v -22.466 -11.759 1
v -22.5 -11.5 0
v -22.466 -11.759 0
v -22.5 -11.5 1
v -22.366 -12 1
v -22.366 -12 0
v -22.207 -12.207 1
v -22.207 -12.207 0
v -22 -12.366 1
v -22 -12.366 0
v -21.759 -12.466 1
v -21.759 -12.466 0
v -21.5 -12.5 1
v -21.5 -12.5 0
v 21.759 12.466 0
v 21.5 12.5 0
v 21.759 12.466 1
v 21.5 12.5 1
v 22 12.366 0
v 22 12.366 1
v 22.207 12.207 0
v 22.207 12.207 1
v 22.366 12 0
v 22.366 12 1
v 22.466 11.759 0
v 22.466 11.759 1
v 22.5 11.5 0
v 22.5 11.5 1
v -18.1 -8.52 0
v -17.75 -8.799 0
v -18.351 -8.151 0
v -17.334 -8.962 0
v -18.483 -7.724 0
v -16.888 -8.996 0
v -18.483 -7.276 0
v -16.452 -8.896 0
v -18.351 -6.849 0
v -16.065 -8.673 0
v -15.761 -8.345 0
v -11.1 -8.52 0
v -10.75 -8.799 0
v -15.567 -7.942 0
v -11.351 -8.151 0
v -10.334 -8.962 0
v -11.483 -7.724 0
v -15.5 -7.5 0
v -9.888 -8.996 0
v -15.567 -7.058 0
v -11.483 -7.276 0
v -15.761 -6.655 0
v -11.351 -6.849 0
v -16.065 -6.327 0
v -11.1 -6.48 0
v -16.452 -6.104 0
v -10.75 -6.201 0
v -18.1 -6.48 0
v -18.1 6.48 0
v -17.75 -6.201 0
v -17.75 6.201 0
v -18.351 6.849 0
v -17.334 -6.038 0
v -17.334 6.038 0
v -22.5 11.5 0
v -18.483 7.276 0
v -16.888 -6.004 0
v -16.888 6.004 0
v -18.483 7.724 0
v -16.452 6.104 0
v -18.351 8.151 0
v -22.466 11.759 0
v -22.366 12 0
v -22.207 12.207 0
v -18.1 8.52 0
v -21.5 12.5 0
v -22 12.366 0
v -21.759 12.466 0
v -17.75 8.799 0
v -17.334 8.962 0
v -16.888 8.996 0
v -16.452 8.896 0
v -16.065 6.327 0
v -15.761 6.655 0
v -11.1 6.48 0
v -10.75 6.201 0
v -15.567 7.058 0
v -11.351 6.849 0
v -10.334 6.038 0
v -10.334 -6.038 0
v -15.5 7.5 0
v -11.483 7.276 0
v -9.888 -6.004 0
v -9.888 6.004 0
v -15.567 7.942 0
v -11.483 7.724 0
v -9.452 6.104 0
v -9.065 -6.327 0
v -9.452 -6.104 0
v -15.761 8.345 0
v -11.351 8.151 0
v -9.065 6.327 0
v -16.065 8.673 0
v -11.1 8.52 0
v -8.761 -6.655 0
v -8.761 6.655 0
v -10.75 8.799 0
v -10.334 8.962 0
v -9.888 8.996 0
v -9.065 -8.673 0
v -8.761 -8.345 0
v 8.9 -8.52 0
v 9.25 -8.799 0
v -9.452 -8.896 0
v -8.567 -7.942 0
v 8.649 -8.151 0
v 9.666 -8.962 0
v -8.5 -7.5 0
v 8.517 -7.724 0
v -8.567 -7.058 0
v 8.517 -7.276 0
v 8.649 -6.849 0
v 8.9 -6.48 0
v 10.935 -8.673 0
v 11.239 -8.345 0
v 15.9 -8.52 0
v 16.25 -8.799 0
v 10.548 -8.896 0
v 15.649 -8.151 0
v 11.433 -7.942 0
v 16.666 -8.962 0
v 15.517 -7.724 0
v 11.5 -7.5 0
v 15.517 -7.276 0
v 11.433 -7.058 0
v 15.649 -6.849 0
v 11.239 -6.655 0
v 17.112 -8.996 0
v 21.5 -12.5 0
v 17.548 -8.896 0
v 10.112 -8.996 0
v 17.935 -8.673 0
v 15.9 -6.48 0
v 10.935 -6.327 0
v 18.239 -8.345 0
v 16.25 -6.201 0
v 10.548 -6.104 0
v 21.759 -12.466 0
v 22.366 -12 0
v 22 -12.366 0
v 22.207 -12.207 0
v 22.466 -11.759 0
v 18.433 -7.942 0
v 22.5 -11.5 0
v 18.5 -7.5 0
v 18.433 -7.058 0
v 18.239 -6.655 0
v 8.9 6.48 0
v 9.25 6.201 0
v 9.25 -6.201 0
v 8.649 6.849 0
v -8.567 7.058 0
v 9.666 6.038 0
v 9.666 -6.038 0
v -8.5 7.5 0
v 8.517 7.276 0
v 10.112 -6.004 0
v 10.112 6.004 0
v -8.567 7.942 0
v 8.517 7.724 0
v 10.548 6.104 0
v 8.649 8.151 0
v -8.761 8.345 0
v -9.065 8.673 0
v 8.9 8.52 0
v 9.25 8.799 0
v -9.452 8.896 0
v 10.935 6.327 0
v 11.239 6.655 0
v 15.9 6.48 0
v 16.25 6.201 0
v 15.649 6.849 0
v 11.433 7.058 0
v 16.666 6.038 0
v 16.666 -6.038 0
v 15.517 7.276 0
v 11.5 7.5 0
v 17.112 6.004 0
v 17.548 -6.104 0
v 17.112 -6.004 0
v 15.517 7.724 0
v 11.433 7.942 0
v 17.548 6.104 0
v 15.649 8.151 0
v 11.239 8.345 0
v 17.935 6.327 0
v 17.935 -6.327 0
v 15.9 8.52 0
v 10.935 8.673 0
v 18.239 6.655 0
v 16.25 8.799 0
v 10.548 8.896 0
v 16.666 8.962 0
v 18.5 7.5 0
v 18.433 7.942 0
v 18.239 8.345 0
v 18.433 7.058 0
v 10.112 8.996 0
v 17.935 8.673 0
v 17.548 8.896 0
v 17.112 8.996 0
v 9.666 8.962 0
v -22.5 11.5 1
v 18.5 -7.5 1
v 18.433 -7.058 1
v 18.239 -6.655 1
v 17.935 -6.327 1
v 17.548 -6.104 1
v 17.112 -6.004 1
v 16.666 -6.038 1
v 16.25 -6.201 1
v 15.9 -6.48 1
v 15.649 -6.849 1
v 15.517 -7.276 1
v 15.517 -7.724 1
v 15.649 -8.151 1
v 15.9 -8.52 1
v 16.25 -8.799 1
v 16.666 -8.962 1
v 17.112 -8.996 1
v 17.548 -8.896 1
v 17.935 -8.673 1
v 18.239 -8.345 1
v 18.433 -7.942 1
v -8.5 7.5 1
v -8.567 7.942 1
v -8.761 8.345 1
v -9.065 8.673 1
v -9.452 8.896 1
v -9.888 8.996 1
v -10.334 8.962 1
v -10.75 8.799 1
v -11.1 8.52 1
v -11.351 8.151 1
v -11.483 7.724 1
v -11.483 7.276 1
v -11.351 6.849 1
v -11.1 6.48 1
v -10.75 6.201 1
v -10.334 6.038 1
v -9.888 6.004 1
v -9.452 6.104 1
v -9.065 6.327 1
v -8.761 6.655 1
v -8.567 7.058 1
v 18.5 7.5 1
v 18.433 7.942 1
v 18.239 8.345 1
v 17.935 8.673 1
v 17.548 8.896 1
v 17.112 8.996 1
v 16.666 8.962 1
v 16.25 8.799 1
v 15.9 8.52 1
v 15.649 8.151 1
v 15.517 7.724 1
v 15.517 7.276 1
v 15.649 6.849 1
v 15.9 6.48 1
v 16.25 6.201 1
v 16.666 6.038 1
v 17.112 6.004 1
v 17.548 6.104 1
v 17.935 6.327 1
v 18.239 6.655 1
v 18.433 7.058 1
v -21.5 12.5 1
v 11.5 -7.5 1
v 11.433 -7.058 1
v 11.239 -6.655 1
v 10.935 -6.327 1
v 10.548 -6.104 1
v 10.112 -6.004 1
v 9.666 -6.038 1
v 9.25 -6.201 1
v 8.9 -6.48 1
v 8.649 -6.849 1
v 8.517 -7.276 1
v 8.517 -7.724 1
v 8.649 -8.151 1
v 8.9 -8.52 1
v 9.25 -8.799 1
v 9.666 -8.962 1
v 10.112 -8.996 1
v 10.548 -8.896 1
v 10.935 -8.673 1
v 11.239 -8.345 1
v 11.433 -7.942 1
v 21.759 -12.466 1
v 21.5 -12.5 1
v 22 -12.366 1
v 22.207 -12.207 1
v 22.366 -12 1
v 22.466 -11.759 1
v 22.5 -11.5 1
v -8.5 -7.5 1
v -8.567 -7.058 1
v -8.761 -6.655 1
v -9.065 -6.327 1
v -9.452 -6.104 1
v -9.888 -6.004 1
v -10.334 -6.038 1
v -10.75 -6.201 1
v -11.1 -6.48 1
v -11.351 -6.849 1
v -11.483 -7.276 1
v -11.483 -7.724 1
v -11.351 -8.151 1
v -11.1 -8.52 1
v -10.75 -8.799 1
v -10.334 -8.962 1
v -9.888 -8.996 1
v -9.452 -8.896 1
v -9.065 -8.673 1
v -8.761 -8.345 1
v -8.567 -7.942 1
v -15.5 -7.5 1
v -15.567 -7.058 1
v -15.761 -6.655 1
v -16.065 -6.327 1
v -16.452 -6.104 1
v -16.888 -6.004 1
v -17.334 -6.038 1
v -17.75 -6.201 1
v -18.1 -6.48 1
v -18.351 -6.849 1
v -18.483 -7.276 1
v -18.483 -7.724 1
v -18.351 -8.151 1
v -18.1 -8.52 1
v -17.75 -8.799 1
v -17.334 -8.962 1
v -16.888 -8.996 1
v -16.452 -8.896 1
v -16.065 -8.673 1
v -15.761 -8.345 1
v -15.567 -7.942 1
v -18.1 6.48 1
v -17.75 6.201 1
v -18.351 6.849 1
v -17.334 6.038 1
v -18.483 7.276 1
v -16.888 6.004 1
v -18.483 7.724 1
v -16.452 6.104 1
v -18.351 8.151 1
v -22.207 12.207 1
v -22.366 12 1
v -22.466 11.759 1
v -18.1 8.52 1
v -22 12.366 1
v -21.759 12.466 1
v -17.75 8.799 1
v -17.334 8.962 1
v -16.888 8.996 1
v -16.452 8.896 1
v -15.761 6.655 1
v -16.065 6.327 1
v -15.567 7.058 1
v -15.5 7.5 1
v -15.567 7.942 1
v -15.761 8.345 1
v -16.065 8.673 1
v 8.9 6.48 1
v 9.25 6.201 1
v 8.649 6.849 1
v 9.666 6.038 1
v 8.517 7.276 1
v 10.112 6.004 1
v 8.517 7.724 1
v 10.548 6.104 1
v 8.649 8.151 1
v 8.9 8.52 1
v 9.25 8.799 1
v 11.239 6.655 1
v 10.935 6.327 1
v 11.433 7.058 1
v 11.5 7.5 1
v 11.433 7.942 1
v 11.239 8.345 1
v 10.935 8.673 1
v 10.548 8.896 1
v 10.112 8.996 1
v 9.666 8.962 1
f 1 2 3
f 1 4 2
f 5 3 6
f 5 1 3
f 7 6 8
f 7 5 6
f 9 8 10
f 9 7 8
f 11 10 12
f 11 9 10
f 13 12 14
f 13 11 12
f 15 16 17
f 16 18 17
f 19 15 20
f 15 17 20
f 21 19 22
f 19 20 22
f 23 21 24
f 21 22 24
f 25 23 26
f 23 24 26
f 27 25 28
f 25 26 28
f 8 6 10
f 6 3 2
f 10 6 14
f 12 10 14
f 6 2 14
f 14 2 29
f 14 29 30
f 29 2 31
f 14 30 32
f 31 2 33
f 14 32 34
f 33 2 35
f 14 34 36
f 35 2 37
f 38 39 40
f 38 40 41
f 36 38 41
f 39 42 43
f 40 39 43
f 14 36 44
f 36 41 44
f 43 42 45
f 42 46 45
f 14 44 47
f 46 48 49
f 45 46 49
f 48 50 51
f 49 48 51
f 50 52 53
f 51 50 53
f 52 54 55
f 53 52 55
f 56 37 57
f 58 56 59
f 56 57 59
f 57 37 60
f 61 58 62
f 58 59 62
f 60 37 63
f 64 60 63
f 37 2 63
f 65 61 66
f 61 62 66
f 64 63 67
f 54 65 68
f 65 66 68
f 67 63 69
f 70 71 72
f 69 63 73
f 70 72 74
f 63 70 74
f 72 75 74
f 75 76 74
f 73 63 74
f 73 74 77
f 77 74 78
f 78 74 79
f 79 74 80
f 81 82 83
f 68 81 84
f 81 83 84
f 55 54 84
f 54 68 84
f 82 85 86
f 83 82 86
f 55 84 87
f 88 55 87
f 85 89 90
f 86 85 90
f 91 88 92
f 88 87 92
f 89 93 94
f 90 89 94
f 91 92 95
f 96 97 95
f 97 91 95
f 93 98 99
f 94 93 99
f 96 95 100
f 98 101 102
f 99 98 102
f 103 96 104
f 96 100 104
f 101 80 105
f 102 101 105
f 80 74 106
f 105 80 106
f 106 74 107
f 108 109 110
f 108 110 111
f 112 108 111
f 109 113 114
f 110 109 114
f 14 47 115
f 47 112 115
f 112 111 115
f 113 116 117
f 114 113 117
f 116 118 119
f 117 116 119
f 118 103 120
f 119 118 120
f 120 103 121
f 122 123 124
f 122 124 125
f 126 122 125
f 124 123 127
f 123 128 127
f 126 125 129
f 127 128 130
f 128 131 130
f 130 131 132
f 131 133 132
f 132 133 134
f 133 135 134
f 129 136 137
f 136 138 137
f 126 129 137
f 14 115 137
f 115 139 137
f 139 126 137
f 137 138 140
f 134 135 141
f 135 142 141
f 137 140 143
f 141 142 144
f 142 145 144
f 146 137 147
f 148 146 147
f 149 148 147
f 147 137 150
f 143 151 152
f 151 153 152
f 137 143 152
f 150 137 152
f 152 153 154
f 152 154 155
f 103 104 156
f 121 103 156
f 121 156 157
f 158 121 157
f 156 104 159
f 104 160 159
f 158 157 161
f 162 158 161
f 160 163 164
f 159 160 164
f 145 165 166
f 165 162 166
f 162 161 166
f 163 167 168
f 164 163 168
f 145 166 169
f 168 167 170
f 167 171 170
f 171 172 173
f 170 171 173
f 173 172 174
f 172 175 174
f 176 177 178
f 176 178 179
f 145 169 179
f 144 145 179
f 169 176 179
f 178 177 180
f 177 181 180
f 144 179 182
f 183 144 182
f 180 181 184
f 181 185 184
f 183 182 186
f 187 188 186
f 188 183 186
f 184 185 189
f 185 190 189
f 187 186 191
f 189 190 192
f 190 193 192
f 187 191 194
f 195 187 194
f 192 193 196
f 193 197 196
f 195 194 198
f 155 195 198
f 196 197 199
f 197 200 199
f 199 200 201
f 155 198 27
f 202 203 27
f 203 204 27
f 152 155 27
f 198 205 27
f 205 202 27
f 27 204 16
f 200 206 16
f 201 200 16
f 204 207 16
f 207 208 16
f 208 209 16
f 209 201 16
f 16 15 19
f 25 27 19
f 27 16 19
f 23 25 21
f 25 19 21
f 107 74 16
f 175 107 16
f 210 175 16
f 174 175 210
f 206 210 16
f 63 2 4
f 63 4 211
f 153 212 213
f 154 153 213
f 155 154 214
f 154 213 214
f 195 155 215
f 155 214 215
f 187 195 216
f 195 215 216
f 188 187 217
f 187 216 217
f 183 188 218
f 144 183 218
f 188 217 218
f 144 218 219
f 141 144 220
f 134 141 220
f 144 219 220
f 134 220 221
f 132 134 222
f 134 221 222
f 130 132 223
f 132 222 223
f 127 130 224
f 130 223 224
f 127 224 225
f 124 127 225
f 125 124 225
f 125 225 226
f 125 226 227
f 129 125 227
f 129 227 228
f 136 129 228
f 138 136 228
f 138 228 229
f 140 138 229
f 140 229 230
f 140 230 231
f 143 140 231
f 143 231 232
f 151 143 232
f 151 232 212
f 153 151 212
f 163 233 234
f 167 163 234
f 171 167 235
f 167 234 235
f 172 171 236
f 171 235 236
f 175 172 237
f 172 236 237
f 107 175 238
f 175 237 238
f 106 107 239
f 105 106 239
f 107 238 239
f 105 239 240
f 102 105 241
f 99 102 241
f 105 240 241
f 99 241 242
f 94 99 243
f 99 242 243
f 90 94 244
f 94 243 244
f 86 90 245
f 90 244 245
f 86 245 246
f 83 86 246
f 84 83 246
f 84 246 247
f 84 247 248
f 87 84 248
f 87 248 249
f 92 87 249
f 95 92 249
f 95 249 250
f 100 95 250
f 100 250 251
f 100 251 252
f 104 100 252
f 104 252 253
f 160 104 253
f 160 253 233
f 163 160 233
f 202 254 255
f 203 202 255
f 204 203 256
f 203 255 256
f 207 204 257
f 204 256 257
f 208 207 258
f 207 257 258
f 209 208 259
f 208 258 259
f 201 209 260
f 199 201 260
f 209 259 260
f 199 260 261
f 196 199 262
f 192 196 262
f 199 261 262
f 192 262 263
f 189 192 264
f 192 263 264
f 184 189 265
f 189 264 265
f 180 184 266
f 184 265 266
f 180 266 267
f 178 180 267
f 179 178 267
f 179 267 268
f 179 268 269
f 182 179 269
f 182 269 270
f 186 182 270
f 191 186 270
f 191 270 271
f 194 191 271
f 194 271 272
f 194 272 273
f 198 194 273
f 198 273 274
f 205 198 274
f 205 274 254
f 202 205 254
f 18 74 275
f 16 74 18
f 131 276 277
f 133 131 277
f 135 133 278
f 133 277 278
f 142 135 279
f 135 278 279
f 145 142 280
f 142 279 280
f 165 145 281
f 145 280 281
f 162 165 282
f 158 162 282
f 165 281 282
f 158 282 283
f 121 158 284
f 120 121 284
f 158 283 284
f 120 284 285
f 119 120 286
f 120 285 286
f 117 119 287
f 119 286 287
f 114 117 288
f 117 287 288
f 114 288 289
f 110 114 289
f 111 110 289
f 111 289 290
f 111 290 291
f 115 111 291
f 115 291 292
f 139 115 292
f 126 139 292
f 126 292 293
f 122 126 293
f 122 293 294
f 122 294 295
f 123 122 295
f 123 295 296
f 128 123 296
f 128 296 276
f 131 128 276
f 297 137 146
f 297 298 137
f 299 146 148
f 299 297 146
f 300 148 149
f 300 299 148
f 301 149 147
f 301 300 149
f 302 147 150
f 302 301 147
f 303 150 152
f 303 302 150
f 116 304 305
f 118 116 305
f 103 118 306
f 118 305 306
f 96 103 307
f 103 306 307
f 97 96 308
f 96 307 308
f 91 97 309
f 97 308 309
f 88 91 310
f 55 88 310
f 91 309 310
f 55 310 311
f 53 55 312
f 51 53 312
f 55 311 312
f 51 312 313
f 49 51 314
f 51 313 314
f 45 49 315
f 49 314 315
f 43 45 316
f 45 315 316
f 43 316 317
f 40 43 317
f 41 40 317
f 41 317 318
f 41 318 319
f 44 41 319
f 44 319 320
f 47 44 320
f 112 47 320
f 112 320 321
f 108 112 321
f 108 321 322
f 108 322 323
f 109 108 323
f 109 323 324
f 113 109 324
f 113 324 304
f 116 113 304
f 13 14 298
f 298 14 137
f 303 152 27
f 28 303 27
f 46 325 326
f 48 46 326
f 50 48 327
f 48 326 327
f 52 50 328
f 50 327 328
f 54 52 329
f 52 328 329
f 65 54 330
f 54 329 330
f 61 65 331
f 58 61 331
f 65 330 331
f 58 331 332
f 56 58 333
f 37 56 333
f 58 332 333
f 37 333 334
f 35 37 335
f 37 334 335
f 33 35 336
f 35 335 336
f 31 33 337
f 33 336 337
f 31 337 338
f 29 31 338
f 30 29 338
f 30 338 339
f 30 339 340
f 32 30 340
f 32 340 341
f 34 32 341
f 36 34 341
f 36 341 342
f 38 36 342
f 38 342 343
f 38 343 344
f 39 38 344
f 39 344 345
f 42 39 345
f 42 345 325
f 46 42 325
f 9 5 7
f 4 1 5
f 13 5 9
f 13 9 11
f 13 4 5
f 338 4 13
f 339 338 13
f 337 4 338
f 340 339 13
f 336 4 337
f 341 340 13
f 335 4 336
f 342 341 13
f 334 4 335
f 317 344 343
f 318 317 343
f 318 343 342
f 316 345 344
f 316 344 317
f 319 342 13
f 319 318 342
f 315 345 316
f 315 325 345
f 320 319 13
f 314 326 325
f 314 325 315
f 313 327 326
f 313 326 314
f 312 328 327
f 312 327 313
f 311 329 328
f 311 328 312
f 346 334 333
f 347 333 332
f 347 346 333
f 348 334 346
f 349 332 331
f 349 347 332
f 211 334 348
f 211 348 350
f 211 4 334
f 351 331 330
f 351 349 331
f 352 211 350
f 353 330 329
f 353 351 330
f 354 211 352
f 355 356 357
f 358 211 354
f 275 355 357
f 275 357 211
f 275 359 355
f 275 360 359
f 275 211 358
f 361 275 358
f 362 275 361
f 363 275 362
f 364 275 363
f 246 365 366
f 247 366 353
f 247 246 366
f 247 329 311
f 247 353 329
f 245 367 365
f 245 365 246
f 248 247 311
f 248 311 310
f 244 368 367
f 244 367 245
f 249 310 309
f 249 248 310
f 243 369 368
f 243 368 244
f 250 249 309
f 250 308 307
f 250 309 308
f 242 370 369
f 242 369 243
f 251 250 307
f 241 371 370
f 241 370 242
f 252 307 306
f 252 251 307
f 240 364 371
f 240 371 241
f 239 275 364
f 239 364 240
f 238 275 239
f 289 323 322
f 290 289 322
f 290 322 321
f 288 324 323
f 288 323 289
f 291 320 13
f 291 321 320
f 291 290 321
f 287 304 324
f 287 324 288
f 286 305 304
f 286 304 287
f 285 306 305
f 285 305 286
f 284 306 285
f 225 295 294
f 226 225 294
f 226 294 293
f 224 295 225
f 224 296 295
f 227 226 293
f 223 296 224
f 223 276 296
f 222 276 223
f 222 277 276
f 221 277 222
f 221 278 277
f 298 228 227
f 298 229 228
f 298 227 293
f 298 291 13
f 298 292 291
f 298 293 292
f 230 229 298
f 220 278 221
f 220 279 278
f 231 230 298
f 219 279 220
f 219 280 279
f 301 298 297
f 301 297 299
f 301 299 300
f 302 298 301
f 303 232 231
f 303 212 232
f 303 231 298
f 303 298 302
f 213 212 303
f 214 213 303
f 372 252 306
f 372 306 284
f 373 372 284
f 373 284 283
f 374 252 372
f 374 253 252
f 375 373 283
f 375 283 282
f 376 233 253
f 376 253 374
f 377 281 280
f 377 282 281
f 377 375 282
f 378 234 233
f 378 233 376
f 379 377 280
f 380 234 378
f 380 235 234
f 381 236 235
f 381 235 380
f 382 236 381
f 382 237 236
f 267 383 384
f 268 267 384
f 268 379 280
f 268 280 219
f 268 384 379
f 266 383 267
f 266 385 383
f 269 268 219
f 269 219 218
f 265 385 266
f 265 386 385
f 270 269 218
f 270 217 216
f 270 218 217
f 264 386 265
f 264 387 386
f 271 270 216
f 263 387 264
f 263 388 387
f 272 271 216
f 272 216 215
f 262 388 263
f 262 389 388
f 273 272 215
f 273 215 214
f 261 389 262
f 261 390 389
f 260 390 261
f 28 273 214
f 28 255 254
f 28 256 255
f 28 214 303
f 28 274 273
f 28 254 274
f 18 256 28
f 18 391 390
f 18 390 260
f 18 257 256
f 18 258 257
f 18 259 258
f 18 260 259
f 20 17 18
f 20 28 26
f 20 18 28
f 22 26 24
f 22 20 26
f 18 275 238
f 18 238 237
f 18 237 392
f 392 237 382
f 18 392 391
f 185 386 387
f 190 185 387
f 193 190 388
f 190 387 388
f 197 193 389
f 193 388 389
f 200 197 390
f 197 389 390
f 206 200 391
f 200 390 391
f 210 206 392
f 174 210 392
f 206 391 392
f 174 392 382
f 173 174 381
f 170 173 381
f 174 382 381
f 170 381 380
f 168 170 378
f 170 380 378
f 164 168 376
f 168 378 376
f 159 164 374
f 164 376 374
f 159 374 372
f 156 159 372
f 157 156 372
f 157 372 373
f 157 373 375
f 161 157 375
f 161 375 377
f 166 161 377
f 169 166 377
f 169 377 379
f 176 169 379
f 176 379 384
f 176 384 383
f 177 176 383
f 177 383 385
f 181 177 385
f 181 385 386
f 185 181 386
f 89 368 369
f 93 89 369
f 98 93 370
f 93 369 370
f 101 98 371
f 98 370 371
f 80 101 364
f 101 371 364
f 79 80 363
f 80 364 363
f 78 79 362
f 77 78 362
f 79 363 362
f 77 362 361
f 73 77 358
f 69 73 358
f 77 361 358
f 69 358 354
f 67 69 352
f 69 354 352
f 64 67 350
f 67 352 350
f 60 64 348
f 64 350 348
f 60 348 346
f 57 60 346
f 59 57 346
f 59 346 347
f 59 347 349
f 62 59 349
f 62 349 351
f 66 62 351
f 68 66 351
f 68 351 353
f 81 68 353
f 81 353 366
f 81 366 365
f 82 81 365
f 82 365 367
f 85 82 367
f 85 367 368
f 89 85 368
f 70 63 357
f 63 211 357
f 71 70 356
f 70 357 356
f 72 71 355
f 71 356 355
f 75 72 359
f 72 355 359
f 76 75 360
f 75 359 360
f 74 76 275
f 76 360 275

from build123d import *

# Parameters (mm, degrees)
SKETCH1_W           = 45
SKETCH1_H           = 25
BOSS_EXTRUDE1_DEPTH = 1
SKETCH2_R           = 1.5
CUT_EXTRUDE1_DEPTH  = 2
FILLET1_R           = 1


with BuildPart() as part:
    # Sketch1 → Boss-Extrude1 (new body)
    with BuildSketch(Plane.XY):
        Rectangle(SKETCH1_W, SKETCH1_H)
    extrude(amount=BOSS_EXTRUDE1_DEPTH)

    # Sketch2 → Cut-Extrude1 (cut, through all)
    with BuildSketch(Plane.XY.offset(1)):
        with Locations((17, 7.5)):
            Circle(SKETCH2_R)
        with Locations((10, 7.5)):
            Circle(SKETCH2_R)
        with Locations((-17, 7.5)):
            Circle(SKETCH2_R)
        with Locations((-10, 7.5)):
            Circle(SKETCH2_R)
        with Locations((17, -7.5)):
            Circle(SKETCH2_R)
        with Locations((10, -7.5)):
            Circle(SKETCH2_R)
        with Locations((-17, -7.5)):
            Circle(SKETCH2_R)
        with Locations((-10, -7.5)):
            Circle(SKETCH2_R)
    extrude(amount=-CUT_EXTRUDE1_DEPTH, mode=Mode.SUBTRACT)

    # Fillet1
    fillet1_edges = [part.edges().sort_by_distance(p)[0] for p in [
        (22.5, -12.5, 0.5),
        (-22.5, -12.5, 0.5),
        (-22.5, 12.5, 0.5),
        (22.5, 12.5, 0.5),
    ]]
    fillet(fillet1_edges, radius=FILLET1_R)


solid = part.part
